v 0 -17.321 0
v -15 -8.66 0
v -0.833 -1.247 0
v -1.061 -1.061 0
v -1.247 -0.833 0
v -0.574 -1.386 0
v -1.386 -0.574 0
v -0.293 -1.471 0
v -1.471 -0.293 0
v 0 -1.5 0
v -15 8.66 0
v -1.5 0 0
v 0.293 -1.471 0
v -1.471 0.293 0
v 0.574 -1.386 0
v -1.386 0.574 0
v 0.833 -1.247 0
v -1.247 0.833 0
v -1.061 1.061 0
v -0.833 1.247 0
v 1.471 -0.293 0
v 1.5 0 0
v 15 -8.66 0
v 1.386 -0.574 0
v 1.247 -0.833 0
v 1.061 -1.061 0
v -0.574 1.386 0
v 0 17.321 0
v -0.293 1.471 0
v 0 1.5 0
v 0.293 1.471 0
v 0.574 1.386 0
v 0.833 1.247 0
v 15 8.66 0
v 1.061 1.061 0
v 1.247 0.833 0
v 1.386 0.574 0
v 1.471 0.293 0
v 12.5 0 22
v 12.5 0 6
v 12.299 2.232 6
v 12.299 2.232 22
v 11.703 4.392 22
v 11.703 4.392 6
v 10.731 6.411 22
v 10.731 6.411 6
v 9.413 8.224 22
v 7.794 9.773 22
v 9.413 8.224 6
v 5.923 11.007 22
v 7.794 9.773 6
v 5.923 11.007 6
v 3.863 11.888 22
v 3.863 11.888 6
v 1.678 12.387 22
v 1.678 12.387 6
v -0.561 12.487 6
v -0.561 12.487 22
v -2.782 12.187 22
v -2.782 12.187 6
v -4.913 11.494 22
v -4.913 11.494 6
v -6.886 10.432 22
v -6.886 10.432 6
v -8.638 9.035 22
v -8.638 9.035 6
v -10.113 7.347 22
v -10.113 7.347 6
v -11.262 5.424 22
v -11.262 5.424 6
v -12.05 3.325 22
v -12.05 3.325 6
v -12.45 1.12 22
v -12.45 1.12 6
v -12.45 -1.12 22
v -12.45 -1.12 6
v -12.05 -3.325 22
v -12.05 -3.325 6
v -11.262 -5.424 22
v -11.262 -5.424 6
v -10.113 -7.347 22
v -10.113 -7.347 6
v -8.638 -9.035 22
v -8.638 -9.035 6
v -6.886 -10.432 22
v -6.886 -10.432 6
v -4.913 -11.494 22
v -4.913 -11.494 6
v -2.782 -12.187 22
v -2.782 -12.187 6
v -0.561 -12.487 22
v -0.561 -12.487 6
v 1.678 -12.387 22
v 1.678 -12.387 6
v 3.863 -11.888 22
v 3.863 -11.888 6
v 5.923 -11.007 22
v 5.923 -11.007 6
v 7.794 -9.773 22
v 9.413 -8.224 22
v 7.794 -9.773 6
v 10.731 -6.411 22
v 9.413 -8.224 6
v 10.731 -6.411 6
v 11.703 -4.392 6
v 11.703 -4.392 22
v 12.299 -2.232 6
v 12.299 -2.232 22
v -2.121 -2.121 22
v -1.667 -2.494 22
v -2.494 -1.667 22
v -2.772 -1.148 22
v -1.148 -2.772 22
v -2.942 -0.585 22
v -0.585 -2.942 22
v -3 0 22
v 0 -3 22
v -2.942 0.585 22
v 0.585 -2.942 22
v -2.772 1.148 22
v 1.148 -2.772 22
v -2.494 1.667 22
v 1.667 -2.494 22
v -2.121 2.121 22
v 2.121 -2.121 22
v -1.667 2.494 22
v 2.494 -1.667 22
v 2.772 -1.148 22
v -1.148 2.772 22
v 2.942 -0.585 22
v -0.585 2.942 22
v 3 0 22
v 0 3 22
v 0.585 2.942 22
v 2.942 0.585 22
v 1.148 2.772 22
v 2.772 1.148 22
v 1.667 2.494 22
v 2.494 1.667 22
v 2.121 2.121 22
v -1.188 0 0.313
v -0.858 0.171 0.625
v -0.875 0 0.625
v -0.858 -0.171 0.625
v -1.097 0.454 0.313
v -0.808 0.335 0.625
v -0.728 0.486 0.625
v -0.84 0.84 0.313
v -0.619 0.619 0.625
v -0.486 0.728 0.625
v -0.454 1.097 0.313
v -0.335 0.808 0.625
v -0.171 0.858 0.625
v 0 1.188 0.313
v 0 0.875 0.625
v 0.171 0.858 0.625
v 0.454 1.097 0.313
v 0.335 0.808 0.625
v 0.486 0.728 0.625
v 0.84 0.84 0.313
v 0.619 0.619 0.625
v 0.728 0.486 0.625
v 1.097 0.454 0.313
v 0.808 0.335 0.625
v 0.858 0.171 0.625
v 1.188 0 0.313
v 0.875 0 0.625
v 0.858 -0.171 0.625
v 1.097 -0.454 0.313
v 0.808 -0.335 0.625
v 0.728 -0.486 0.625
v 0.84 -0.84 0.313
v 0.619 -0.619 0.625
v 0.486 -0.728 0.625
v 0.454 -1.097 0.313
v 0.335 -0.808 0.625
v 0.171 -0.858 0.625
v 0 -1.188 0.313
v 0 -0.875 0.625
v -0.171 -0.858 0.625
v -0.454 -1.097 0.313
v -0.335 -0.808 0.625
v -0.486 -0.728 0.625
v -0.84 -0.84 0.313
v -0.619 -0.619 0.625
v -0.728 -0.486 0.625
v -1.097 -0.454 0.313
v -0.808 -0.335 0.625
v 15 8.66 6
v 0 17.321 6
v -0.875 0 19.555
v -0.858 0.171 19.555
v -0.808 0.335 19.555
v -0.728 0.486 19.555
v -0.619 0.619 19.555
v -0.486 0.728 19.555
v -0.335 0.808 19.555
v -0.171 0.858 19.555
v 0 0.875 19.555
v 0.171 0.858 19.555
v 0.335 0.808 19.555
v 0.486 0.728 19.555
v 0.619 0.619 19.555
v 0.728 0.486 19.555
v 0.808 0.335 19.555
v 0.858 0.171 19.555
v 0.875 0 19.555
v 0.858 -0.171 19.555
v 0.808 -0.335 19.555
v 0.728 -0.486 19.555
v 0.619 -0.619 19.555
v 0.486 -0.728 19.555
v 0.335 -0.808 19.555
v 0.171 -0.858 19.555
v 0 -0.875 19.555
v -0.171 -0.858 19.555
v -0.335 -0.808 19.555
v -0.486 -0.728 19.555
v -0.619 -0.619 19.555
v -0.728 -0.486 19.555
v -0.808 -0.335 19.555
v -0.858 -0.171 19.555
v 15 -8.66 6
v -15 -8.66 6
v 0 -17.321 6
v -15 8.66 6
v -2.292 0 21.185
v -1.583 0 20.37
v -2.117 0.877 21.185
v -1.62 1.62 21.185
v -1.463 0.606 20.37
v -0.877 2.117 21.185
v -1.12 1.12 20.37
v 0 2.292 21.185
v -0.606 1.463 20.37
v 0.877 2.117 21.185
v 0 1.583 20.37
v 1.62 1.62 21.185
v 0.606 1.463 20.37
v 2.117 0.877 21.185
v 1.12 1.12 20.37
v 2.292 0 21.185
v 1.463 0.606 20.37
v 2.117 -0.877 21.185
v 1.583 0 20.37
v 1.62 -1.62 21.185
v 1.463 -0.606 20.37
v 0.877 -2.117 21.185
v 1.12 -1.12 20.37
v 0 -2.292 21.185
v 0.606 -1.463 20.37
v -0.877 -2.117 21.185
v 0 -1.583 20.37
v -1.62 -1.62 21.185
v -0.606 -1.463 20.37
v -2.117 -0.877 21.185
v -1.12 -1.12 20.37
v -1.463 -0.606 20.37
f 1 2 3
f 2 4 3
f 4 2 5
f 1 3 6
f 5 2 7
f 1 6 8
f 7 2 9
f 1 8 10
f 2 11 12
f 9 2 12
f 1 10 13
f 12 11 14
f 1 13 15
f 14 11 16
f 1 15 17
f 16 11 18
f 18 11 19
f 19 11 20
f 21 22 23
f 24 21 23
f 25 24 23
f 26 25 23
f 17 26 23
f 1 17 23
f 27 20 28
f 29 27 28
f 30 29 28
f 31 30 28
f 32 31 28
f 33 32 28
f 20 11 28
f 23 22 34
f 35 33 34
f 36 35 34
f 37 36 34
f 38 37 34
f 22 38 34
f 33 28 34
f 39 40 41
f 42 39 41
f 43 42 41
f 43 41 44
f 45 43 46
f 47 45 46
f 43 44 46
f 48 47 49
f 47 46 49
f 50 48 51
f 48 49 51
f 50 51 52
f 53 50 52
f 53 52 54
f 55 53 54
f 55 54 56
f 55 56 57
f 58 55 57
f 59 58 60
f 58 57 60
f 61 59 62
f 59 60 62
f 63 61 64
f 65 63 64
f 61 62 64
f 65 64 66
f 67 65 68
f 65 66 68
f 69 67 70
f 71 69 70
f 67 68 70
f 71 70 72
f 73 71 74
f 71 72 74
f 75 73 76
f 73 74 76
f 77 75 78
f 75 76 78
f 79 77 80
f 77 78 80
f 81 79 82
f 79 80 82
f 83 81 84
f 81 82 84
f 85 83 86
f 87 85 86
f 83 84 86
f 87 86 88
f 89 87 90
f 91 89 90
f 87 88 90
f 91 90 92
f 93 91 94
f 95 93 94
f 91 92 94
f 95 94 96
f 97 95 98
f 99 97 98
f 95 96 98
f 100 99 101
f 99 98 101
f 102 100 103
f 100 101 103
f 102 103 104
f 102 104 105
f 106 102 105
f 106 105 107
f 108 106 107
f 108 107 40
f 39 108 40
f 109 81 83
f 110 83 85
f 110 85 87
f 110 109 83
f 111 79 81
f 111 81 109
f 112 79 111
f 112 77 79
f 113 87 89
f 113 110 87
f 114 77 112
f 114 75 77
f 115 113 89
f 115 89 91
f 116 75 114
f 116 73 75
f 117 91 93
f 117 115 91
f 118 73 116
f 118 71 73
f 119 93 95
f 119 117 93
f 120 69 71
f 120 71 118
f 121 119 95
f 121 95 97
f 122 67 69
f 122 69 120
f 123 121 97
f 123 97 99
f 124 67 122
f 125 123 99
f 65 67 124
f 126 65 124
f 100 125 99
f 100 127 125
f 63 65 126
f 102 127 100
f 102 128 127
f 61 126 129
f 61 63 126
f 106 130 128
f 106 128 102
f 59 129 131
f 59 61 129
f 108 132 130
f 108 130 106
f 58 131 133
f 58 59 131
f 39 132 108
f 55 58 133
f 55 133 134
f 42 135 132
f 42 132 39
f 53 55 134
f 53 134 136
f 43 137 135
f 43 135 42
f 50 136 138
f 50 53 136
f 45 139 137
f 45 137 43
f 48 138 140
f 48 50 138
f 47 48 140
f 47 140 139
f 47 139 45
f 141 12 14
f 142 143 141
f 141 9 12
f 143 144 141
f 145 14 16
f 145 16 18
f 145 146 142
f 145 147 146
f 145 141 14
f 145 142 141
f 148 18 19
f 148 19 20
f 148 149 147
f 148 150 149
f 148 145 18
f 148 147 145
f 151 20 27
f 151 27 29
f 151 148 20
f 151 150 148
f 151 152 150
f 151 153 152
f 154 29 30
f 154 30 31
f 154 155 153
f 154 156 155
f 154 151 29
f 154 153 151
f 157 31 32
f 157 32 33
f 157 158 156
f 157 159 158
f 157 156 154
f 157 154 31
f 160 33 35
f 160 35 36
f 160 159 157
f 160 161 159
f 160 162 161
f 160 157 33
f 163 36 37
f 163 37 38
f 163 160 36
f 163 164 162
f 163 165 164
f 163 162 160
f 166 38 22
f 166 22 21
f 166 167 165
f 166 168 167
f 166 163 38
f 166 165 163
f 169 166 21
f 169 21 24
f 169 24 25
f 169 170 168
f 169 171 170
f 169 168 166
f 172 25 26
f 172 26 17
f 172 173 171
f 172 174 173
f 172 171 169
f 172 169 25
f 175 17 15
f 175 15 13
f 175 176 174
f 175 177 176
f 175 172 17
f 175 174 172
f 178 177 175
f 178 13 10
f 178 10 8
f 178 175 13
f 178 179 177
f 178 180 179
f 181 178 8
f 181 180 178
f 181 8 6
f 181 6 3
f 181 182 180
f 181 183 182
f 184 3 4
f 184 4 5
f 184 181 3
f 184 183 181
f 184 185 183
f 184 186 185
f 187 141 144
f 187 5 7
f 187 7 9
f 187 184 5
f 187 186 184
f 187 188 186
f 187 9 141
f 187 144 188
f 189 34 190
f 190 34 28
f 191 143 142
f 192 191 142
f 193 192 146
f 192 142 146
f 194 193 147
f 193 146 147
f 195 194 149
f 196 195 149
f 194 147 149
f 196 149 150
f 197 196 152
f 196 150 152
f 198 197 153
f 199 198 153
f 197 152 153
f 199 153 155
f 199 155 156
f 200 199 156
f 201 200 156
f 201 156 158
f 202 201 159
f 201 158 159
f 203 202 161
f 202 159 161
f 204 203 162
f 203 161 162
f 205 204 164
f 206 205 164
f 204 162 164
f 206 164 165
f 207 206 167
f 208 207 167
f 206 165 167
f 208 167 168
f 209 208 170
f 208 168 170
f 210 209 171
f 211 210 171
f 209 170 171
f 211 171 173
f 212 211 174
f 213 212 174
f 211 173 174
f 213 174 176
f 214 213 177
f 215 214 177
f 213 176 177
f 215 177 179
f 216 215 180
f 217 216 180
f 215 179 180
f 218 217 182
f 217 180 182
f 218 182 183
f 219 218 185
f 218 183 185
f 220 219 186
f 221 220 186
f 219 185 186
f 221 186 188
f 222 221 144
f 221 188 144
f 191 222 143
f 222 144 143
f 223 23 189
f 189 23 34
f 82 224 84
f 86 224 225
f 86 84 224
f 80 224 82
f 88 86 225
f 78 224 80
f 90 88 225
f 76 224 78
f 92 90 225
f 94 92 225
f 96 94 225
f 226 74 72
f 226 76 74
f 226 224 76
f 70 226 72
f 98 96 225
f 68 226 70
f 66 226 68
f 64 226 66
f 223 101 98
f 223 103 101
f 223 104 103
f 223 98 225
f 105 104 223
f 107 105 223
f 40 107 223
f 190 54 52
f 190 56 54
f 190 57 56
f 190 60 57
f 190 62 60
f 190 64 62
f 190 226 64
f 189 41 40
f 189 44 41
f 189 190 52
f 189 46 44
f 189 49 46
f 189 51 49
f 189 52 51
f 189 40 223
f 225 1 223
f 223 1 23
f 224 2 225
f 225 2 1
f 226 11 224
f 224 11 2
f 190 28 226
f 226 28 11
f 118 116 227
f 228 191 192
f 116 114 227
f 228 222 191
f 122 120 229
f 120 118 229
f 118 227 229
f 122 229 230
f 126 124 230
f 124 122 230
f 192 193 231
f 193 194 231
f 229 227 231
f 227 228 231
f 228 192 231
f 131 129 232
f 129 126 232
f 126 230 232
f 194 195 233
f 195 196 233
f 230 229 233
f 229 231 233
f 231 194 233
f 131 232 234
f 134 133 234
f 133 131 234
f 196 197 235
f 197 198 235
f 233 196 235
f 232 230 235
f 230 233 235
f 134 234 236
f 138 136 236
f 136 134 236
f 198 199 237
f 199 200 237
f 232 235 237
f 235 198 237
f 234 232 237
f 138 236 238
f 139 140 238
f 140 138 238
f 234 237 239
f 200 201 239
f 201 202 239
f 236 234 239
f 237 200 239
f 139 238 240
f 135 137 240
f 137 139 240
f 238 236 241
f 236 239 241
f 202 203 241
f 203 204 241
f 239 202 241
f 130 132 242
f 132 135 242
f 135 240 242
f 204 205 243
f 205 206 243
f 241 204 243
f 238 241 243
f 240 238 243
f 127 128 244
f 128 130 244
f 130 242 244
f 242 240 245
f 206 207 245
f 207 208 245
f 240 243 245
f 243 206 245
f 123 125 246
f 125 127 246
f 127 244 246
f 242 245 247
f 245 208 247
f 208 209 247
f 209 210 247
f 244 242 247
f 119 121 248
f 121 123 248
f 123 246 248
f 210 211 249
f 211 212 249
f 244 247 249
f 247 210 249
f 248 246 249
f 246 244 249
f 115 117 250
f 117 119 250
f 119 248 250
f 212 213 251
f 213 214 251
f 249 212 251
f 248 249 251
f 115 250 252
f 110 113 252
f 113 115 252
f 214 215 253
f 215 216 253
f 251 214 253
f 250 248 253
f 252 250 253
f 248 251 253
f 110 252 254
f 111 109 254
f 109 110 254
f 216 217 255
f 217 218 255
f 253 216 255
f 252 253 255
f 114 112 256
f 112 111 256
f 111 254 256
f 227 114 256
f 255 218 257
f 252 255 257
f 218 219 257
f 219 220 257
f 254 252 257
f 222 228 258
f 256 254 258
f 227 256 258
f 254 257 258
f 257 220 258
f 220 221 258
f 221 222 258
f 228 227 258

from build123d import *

# Parameters (mm, degrees)
ESTRUSIONE_ESTRUSIONE1_DEPTH = 6
SCHIZZO2_R                   = 12.5
ESTRUSIONE_ESTRUSIONE2_DEPTH = 16
FORO1_D                      = 1.75
FORO1_CSINK_D                = 6
FORO1_CSINK_ANGLE            = 82


with BuildPart() as part:
    # Schizzo1 → Estrusione-Estrusione1 (new body)
    with BuildSketch(Plane.XY):
        Polygon((0, 17.320508076), (-15, 8.660254038), (-15, -8.660254038), (0, -17.320508076), (15, -8.660254038), (15, 8.660254038), align=None)
    extrude(amount=ESTRUSIONE_ESTRUSIONE1_DEPTH)

    # Schizzo2 → Estrusione-Estrusione2 (add)
    with BuildSketch(Plane.XY.offset(6)):
        Circle(SCHIZZO2_R)
    extrude(amount=ESTRUSIONE_ESTRUSIONE2_DEPTH)

    # Foro1 (through all)
    with Locations(Plane.XY.offset(22)):
        with Locations((0, 0)):
            CounterSinkHole(FORO1_D / 2, FORO1_CSINK_D / 2, counter_sink_angle=FORO1_CSINK_ANGLE)

    # Schizzo7 → Taglia-Rivoluzione1 (revolve, cut)
    with BuildSketch(Plane(origin=(0, 0, 0), x_dir=(1, 0, 0), z_dir=(0, 1, 0))):
        Polygon((-1.5, 0), (0, -1.5), (0, 0), align=None)
    revolve(axis=Axis((0, 0, 1.5), (0, 0, -1)), mode=Mode.SUBTRACT)


solid = part.part
